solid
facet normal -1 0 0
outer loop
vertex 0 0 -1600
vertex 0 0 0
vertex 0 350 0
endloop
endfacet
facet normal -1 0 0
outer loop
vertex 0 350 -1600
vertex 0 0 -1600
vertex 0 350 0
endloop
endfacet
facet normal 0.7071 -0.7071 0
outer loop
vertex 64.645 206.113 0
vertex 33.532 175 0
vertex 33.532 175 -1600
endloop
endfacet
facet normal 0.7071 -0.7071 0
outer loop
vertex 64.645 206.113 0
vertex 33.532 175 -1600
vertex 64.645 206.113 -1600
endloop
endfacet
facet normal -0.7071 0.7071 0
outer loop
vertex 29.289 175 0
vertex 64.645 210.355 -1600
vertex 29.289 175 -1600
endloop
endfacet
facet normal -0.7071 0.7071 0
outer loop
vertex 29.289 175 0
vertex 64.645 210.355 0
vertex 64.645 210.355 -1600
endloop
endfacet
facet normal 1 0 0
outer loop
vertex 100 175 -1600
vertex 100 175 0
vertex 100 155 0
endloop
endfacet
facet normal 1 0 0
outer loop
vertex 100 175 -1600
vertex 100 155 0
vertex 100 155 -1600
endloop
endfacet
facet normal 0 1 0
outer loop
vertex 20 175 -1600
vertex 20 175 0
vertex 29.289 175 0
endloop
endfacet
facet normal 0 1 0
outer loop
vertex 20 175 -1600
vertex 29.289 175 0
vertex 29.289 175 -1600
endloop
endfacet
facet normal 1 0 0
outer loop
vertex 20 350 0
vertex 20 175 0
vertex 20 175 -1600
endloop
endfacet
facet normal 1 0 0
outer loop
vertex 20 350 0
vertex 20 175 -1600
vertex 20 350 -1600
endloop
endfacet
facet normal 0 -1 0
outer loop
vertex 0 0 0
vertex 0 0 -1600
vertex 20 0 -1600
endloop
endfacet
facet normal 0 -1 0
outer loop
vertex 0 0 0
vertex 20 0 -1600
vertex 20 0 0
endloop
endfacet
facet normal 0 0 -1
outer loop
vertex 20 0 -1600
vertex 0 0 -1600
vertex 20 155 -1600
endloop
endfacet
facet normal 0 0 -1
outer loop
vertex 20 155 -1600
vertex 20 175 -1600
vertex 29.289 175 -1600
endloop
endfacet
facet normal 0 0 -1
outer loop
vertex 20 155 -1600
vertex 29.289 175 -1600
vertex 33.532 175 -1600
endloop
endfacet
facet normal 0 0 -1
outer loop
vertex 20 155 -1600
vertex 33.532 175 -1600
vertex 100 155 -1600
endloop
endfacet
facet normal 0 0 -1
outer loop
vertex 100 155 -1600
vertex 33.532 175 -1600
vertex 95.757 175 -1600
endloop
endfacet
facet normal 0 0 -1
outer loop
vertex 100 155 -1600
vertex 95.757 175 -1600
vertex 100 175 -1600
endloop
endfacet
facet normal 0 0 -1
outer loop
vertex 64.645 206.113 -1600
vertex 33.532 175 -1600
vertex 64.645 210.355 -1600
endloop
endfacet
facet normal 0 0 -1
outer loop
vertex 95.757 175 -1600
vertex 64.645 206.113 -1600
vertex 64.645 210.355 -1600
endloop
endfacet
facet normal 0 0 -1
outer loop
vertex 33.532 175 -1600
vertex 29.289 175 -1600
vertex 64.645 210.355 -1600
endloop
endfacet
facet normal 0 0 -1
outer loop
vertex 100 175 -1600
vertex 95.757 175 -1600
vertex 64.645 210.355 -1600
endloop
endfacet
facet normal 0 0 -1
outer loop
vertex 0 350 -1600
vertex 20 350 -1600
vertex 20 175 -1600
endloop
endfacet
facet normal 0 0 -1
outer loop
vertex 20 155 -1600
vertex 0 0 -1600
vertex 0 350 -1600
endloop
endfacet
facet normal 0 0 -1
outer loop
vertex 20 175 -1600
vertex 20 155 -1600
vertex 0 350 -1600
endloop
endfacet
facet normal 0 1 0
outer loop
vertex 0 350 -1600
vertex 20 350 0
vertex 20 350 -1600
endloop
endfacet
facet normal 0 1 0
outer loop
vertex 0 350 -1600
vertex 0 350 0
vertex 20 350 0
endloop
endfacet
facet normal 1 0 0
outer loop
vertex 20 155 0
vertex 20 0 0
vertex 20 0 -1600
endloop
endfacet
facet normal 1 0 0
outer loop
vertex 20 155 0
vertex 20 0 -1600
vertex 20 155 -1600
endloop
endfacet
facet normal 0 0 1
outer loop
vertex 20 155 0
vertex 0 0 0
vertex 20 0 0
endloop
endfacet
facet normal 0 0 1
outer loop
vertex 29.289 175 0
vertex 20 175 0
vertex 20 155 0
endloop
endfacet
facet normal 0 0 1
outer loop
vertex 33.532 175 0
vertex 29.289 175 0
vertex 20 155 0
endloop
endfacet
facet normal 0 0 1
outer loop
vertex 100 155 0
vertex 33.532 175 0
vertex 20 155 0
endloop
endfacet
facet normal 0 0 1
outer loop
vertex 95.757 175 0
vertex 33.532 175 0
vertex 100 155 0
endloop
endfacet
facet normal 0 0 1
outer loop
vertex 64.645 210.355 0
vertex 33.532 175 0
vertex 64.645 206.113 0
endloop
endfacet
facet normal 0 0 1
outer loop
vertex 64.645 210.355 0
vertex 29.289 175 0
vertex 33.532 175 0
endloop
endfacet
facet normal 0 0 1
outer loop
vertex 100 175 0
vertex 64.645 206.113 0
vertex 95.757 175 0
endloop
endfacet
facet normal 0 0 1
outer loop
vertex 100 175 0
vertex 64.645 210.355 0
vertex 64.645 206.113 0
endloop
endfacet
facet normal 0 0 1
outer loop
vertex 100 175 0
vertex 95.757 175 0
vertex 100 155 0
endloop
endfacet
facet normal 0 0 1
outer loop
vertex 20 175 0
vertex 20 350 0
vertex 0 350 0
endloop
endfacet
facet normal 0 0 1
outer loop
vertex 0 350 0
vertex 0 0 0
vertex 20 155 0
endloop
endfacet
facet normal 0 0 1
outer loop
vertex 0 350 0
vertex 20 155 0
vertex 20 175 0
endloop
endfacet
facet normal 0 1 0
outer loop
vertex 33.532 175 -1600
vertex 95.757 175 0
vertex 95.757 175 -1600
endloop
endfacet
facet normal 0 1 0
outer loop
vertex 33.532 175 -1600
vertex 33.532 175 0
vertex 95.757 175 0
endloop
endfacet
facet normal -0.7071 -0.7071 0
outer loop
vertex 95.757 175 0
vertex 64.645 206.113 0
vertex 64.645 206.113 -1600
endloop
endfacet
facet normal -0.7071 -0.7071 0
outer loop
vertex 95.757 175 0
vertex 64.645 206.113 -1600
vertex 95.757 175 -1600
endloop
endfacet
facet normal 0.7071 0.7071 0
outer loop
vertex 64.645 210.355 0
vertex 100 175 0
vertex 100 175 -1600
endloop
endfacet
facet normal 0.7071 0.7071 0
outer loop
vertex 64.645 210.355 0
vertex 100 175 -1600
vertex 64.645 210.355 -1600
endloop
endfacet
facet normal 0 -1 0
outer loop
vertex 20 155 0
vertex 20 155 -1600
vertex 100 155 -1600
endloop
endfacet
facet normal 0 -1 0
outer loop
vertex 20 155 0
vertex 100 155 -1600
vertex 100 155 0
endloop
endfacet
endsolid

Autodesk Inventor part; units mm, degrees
ref_plane "YZ Plane" through (0, 0, 0) normal (1, 0, 0) x (0, 1, 0)
ref_plane "XZ Plane" through (0, 0, 0) normal (0, 1, 0) x (-1, 0, 0)
ref_plane "XY Plane" through (0, 0, 0) normal (0, 0, 1) x (1, 0, 0)
sketch "Sketch1" plane through (0, 0, 0) normal (1, 0, 0) x (0, 1, 0)
  line L0 (0, 0) -> (350, 0)
  line L1 (350, 0) -> (350, -1600)
  line L2 (350, -1600) -> (0, -1600)
  line L3 (0, -1600) -> (0, 0)
  dimension "d0" = 350
  dimension "d1" = 1600
extrude "Extrusion1" add sketch "Sketch1" along normal blind 20
sketch "Sketch3" plane through (0, 0, 0) normal (0, 0, 1) x (1, 0, 0)
  point P0 (0, 0)
sketch "Sketch6" plane through (20, 0, 0) normal (1, 0, 0) x (0, 0, -1)
  line L0 (0, 350) -> (0, 0) projected
  line L1 (1600, 0) -> (1600, 350) projected
  line L2 (0, 175) -> (1600, 175)
  line L3 (1600, 175) -> (1600, 155)
  line L4 (1600, 155) -> (0, 155)
  line L5 (0, 155) -> (0, 175)
  point P0 (0, 155)
  dimension "d11" = 20
extrude "Extrusion4" add sketch "Sketch6" along normal blind 80
sketch "Sketch7" plane through (0, 0, 0) normal (0, 0, 1) x (1, 0, 0)
  line L0 (100, 155) -> (100, 175) projected
  line L1 (100, 175) -> (64.6447, 210.3553)
  line L2 (100, 175) -> (150, 175) construction
  line L3 (64.6447, 210.3553) -> (29.2893, 175)
  line L4 (29.2893, 175) -> (33.532, 175)
  line L5 (20, 175) -> (100, 175) projected
  line L6 (33.532, 175) -> (64.6447, 206.1127)
  line L7 (64.6447, 206.1127) -> (95.7574, 175)
  point P0 (0, 0)
  dimension "d14" = 50
  dimension "d15" = 135
  dimension "d16" = 50
  dimension "d18" = 3
  dimension "d19" = 3
extrude "Extrusion5" add sketch "Sketch7" against normal blind 1600 contours L5 L7 L6 L4 L3 L1
properties part number "Riel superior"
